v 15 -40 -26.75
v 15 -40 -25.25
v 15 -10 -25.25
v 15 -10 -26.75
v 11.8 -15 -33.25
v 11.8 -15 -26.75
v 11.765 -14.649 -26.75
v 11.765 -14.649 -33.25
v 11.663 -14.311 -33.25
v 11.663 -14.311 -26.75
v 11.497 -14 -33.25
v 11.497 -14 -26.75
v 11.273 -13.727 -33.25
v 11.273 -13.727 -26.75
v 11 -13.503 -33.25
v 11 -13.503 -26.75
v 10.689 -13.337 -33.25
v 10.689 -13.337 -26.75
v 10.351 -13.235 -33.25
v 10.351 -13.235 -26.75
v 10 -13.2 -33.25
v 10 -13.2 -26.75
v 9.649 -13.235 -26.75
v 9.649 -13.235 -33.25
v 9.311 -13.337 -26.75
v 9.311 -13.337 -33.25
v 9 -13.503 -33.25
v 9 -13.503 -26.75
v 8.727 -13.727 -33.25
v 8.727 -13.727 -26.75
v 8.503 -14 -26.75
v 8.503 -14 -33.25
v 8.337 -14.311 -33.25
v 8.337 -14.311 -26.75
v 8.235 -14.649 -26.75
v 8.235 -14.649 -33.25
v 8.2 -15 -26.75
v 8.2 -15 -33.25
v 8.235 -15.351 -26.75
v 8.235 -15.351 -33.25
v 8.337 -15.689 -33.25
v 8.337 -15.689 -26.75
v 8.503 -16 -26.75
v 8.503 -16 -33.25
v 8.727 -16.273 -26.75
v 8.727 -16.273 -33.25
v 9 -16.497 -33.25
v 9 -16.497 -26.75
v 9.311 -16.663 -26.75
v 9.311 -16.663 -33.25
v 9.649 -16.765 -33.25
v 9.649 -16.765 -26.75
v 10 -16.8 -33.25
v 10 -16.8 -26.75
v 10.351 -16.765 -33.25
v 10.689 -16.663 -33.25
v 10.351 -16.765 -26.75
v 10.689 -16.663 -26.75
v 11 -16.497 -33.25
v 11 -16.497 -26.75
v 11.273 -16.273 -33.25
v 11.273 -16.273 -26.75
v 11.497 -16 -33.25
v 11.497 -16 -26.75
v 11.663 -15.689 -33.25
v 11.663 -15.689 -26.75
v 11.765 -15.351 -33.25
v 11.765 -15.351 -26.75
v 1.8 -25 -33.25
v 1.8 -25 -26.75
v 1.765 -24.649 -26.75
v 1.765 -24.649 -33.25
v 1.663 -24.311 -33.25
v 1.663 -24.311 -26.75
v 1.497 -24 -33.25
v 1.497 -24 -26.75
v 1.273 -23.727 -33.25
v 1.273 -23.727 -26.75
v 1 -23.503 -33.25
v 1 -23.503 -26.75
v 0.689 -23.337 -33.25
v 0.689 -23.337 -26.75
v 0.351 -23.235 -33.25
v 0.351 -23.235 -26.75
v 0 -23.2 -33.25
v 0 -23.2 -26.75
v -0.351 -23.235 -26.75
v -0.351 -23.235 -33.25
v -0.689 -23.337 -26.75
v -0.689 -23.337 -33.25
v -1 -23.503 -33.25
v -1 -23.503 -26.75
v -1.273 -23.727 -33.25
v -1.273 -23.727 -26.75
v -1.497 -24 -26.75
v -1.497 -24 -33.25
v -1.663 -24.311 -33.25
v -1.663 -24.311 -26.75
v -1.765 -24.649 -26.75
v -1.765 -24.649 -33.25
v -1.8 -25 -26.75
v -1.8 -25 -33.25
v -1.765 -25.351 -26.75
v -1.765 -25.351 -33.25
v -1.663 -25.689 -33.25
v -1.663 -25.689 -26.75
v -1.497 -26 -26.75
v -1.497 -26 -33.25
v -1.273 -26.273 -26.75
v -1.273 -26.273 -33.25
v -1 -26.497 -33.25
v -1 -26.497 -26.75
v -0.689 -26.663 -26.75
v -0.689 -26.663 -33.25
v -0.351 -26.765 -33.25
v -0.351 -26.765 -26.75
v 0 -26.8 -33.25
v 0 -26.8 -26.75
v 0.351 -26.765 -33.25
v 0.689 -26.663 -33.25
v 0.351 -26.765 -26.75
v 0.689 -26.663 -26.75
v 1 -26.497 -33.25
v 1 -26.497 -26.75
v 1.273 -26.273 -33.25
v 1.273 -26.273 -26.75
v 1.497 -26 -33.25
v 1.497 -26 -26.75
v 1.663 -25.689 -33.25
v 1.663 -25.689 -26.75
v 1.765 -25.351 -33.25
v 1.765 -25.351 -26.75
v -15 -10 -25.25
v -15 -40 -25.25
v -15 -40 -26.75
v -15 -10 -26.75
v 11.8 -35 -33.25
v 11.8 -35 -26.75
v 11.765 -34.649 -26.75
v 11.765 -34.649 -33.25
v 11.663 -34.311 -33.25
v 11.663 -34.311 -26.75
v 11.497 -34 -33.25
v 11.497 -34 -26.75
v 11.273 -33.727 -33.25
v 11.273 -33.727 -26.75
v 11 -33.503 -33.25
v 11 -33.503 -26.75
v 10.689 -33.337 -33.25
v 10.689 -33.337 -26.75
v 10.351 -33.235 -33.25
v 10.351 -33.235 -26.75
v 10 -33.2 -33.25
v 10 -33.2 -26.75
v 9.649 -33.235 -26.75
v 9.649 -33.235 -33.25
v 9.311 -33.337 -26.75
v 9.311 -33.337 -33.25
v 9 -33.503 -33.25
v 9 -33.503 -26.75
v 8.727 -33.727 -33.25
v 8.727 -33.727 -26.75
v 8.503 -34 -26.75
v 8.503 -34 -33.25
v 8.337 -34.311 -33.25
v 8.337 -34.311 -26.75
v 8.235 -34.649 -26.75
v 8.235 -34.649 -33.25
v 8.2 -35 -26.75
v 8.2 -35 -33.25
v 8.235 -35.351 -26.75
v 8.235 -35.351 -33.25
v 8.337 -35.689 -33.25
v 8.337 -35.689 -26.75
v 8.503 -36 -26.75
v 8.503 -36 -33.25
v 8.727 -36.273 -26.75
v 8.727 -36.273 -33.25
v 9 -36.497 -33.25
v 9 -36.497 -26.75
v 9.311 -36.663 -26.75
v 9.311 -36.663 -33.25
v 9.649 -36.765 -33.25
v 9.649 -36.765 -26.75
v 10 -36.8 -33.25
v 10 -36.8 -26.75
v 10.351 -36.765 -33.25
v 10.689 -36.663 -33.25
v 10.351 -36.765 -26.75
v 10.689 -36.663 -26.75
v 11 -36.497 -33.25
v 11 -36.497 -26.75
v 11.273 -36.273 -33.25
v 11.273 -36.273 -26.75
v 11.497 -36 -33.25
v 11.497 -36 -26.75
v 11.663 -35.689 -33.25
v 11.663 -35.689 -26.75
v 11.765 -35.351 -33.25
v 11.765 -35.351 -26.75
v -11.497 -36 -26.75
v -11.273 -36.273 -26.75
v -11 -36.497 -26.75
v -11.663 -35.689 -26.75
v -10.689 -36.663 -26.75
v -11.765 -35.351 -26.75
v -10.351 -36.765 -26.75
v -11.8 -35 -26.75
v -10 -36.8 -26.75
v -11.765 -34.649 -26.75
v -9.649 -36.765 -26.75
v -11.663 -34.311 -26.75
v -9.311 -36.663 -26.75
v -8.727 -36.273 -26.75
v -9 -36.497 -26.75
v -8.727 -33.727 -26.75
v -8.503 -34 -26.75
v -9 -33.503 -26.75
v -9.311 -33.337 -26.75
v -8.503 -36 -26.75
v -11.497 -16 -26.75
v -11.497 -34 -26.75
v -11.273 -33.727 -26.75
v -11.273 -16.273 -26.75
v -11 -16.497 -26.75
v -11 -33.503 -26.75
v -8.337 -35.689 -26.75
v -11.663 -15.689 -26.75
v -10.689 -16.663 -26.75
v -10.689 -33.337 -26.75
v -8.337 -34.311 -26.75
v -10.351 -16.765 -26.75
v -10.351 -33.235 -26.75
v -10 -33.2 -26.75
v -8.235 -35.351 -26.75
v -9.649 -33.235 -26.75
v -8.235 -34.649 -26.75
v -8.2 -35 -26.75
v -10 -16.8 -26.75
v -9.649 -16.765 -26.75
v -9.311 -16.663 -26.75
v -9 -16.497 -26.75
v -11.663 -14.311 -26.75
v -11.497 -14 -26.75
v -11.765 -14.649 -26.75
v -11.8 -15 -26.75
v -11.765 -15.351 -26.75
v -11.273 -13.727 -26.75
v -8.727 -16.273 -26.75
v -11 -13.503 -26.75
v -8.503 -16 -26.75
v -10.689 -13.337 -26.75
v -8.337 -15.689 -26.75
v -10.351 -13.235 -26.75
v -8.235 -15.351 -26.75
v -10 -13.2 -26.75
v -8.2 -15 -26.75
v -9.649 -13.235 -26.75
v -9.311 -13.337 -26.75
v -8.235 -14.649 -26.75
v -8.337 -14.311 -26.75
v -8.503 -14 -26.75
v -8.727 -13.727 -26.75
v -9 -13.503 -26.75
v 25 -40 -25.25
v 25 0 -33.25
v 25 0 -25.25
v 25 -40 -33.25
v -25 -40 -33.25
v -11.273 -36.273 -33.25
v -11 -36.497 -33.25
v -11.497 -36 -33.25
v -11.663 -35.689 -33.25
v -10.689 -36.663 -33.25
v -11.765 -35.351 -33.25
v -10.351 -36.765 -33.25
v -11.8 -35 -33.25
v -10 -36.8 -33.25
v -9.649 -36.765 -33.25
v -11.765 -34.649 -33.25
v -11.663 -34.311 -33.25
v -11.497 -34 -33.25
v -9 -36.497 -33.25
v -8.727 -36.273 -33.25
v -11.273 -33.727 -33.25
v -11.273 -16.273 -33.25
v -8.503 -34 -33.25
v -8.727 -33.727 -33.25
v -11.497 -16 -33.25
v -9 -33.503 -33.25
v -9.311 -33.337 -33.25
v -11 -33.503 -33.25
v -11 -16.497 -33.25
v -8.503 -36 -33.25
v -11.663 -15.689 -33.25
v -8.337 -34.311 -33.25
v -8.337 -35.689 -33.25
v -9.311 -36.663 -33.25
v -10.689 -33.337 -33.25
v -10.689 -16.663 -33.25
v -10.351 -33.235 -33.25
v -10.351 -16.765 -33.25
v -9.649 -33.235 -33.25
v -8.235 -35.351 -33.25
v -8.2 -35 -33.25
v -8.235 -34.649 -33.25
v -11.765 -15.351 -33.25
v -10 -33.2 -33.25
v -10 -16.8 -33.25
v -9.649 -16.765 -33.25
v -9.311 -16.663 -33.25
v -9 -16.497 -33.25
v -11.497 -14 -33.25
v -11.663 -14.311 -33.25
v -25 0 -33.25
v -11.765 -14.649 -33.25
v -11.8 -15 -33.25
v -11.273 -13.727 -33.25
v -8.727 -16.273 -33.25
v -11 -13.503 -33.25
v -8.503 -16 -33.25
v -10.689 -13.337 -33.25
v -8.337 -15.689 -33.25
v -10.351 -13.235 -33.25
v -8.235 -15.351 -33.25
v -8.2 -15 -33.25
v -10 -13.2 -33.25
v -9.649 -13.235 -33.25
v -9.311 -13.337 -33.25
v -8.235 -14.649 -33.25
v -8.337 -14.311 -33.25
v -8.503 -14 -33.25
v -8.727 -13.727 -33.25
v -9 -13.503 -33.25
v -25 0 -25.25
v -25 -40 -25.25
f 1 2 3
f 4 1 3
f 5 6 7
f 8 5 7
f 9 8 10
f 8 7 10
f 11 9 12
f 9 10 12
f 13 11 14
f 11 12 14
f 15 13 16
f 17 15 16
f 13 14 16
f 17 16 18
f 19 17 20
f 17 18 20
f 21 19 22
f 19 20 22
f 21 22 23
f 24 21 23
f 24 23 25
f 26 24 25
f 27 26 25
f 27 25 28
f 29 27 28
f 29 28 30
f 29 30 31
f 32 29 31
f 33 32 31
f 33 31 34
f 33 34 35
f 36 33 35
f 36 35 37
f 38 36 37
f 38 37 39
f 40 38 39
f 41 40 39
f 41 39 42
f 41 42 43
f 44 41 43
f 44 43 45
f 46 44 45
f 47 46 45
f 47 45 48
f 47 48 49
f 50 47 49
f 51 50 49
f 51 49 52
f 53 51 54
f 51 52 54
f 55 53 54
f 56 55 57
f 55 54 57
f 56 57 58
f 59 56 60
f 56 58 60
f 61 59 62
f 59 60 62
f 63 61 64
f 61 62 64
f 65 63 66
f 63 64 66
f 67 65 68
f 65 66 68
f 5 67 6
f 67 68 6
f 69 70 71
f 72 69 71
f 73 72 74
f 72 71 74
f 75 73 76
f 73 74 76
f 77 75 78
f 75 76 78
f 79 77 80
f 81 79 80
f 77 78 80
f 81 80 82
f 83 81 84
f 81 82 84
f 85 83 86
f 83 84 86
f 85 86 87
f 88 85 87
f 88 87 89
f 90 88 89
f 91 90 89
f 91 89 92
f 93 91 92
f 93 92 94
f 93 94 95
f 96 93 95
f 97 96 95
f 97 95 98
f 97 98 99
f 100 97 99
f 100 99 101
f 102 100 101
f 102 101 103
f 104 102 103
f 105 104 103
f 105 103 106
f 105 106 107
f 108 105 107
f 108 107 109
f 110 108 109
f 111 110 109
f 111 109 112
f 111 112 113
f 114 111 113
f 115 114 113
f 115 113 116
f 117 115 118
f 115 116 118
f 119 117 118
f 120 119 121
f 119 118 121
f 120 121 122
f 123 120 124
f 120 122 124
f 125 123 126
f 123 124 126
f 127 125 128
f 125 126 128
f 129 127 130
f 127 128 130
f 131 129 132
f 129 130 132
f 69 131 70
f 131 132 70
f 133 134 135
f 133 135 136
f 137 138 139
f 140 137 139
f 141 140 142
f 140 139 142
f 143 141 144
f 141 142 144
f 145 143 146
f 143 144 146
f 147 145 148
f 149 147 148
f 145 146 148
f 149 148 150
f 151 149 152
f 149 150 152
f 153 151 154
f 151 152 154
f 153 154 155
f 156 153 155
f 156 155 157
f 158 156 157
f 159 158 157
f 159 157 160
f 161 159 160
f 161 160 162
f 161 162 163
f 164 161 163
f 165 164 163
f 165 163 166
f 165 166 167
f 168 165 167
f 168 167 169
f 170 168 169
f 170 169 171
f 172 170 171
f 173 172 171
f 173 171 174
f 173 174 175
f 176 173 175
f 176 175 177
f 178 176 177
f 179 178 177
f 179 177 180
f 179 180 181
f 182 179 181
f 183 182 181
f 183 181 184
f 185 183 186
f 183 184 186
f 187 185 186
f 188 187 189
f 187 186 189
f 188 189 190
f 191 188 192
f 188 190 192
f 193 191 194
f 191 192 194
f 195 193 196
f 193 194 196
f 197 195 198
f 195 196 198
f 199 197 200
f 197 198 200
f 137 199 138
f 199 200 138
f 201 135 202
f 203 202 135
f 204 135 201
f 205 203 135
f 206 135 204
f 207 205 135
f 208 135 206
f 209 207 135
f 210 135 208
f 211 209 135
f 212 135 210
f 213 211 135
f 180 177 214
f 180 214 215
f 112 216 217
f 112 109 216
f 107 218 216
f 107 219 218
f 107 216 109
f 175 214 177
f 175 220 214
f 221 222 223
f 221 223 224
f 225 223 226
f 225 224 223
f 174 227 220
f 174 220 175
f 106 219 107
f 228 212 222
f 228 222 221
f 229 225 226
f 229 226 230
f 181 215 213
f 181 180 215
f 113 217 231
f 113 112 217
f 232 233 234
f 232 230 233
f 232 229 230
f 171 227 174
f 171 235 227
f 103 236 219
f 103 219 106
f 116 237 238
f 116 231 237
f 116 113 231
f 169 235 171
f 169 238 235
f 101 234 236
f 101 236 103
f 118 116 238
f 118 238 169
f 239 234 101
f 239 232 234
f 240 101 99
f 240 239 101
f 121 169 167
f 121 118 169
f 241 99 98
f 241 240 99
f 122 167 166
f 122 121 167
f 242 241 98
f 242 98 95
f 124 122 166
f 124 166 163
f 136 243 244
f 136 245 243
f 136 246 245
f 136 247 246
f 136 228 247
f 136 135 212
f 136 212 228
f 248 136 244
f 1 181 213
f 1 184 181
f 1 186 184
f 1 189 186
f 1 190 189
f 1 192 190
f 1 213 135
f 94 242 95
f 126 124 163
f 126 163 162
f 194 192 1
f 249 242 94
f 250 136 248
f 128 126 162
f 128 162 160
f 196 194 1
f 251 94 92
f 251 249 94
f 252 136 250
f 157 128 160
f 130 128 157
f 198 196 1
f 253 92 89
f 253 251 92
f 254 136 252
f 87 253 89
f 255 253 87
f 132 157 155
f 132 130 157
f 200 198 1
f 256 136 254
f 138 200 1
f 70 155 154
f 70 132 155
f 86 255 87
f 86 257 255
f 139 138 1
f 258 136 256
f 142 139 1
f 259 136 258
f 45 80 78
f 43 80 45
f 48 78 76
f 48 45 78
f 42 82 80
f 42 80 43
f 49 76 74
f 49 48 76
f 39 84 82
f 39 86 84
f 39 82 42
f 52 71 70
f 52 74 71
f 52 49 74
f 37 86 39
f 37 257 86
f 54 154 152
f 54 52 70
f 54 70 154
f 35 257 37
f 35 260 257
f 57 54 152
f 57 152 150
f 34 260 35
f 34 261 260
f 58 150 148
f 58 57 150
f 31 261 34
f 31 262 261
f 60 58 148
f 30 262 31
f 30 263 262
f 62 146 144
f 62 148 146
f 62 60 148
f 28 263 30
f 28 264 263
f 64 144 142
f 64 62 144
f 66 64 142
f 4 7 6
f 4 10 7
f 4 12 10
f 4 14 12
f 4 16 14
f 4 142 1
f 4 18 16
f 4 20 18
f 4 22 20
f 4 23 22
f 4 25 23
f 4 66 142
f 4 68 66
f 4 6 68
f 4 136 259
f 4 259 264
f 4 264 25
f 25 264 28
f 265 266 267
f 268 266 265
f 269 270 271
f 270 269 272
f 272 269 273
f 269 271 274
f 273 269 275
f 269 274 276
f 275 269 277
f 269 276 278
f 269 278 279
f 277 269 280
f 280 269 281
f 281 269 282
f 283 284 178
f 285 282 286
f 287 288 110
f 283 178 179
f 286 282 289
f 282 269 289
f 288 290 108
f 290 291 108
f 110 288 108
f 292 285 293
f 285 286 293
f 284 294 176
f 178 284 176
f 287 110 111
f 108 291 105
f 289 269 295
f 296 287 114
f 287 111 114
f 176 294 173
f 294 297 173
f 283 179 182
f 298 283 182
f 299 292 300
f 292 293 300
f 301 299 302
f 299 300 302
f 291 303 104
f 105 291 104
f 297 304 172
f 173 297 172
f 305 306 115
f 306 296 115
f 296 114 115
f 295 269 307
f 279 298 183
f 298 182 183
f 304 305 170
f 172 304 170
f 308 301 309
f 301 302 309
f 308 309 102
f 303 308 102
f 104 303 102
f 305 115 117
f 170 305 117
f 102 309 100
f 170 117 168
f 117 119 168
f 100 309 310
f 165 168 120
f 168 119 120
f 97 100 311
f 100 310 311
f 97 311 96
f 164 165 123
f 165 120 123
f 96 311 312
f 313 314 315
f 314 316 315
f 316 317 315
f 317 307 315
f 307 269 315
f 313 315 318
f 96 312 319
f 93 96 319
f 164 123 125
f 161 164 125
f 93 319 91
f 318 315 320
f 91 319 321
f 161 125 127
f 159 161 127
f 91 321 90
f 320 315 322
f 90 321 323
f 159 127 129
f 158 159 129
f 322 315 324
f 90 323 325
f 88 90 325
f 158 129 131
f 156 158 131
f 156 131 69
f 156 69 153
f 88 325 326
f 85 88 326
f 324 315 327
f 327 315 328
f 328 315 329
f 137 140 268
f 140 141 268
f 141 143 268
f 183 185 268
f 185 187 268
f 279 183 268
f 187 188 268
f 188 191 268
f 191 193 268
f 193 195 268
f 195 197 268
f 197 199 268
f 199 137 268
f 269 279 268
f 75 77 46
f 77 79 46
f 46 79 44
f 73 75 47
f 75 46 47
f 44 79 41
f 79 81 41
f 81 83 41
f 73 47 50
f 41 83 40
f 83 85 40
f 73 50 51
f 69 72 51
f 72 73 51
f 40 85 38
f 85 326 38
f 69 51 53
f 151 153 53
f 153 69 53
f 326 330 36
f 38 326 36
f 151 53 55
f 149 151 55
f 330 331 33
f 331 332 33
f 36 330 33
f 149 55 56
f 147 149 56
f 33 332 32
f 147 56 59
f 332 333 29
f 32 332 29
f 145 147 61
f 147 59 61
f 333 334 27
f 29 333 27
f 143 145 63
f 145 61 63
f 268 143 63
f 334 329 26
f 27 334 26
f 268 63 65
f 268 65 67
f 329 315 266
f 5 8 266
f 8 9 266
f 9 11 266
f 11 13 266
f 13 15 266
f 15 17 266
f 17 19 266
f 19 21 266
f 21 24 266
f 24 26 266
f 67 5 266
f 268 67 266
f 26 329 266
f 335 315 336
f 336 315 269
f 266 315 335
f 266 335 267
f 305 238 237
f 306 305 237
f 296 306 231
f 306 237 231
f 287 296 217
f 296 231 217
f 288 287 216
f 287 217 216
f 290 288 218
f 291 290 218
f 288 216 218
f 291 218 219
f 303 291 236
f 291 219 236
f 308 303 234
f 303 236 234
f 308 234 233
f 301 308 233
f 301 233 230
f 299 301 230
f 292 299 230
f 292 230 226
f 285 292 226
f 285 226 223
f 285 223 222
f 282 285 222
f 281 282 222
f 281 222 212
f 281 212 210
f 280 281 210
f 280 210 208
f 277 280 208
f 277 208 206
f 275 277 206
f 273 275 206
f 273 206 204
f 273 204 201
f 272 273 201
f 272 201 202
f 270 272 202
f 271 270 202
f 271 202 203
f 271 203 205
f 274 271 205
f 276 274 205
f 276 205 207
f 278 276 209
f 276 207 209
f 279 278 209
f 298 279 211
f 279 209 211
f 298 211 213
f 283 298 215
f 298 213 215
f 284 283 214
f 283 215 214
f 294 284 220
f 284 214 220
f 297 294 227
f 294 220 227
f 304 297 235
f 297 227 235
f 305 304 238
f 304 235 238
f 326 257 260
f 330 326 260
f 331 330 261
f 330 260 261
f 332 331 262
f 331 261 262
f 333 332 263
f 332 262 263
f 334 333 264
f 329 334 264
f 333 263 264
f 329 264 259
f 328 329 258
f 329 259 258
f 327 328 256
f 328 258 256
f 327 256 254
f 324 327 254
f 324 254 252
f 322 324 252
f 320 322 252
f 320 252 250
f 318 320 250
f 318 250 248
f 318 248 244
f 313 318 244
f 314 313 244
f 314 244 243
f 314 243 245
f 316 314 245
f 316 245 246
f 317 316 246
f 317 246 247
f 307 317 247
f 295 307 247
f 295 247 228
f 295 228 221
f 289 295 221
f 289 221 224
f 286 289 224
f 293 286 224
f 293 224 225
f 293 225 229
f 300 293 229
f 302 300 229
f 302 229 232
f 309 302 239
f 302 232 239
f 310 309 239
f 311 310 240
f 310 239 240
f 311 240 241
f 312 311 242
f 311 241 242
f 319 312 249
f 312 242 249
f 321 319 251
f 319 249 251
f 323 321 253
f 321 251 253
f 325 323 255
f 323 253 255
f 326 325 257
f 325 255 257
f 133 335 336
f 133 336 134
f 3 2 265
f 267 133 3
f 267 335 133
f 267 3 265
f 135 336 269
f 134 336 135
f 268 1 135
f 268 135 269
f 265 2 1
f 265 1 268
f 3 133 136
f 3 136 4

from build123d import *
from build123d import SkipClean  # not in build123d's __all__

# Parameters (mm, degrees)
F0_R      = 2.85
F0_R_2    = 11
F1_DEPTH  = 40
F2_W      = 30
F2_H      = 30
F3_DEPTH  = 55
F5_DEPTH  = 30
F6_DEPTH  = 40.001
F7_DEPTH  = 40.001
F8_R      = 1.8
F9_DEPTH  = 11.5
F10_DEPTH = 13
F11_DEPTH = 5


with BuildPart() as f1:
    # F0 (on Front) → F1 (new body)
    with BuildSketch(Plane.XZ):
        with BuildLine():
            Line((15, 28.25), (-15, 28.25))
            ThreePointArc((-15, 28.25), (-22.0710678119, 25.3210678119), (-25, 18.25))
            Line((-25, 18.25), (-25, -38.25))
            Line((-25, -38.25), (25, -38.25))
            Line((25, -38.25), (25, 18.25))
            ThreePointArc((25, 18.25), (22.0710678119, 25.3210678119), (15, 28.25))
        make_face()
        with Locations((0, -18.25)):
            Circle(F0_R, mode=Mode.SUBTRACT)
        Circle(F0_R_2, mode=Mode.SUBTRACT)
        with Locations((0, 18.25)):
            Circle(F0_R, mode=Mode.SUBTRACT)
    extrude(amount=F1_DEPTH)

    # F2 (on face) → F3 (cut)
    with BuildSketch(Plane.XY.offset(28.25)):
        with Locations((0, -25)):
            Rectangle(F2_W, F2_H)
    extrude(amount=-F3_DEPTH, mode=Mode.SUBTRACT)

    # F4 (on face) → F5 (join, through all)
    with BuildSketch(Plane.XZ.offset(40)):
        with BuildLine():
            Line((-15, 17.2291616466), (-15, 19.972135955))
            ThreePointArc((-15, 19.972135955), (-20, 15.5), (-15, 11.027864045))
            Line((-15, 11.027864045), (-15, 13.7708383534))
            ThreePointArc((-15, 13.7708383534), (-17.3, 15.5), (-15, 17.2291616466))
        make_face()
        with BuildLine():
            Line((-15, -17.2291616466), (-15, -19.972135955))
            ThreePointArc((-15, -19.972135955), (-12.1458980338, -18.5), (-11, -15.5))
            ThreePointArc((-11, -15.5), (-12.1458980338, -12.5), (-15, -11.027864045))
            Line((-15, -11.027864045), (-15, -13.7708383534))
            ThreePointArc((-15, -13.7708383534), (-14.061250543, -14.4183346174), (-13.7, -15.5))
            ThreePointArc((-13.7, -15.5), (-14.061250543, -16.5816653826), (-15, -17.2291616466))
        make_face()
        with BuildLine():
            ThreePointArc((20, -15.5), (18.5, -12.1458980338), (15, -11.027864045))
            Line((15, -11.027864045), (15, -13.7708383534))
            ThreePointArc((15, -13.7708383534), (16.5816653826, -14.061250543), (17.3, -15.5))
            ThreePointArc((17.3, -15.5), (16.5816653826, -16.938749457), (15, -17.2291616466))
            Line((15, -17.2291616466), (15, -19.972135955))
            ThreePointArc((15, -19.972135955), (18.5, -18.8541019662), (20, -15.5))
        make_face()
        with BuildLine():
            Line((15, 17.2291616466), (15, 19.972135955))
            ThreePointArc((15, 19.972135955), (11, 15.5), (15, 11.027864045))
            Line((15, 11.027864045), (15, 13.7708383534))
            ThreePointArc((15, 13.7708383534), (13.7, 15.5), (15, 17.2291616466))
        make_face()
    extrude(amount=-F5_DEPTH)

    # F4 (on face) → F6 (cut, through all)
    with BuildSketch(Plane.XZ.offset(40)):
        with BuildLine():
            ThreePointArc((-13.7, 15.5), (-14.061250543, 16.5816653826), (-15, 17.2291616466))
            Line((-15, 17.2291616466), (-15, 13.7708383534))
            ThreePointArc((-15, 13.7708383534), (-14.061250543, 14.4183346174), (-13.7, 15.5))
        make_face()
        with BuildLine():
            ThreePointArc((17.3, 15.5), (16.5816653826, 16.938749457), (15, 17.2291616466))
            Line((15, 17.2291616466), (15, 13.7708383534))
            ThreePointArc((15, 13.7708383534), (16.5816653826, 14.061250543), (17.3, 15.5))
        make_face()
        with BuildLine():
            Line((15, -17.2291616466), (15, -13.7708383534))
            ThreePointArc((15, -13.7708383534), (13.7, -15.5), (15, -17.2291616466))
        make_face()
        with BuildLine():
            ThreePointArc((-15, -13.7708383534), (-17.3, -15.5), (-15, -17.2291616466))
            Line((-15, -17.2291616466), (-15, -13.7708383534))
        make_face()
    with SkipClean():  # cleaning this boolean's faces spoils the solid; the shape is the same uncleaned
        extrude(amount=-F6_DEPTH, mode=Mode.SUBTRACT)

    # F4 (on face) → F7 (cut, through all)
    with BuildSketch(Plane.XZ.offset(40)):
        with BuildLine():
            Line((-15, 13.7708383534), (-15, 17.2291616466))
            ThreePointArc((-15, 17.2291616466), (-17.3, 15.5), (-15, 13.7708383534))
        make_face()
        with BuildLine():
            Line((15, 13.7708383534), (15, 17.2291616466))
            ThreePointArc((15, 17.2291616466), (13.7, 15.5), (15, 13.7708383534))
        make_face()
        with BuildLine():
            Line((-15, -13.7708383534), (-15, -17.2291616466))
            ThreePointArc((-15, -17.2291616466), (-14.061250543, -16.5816653826), (-13.7, -15.5))
            ThreePointArc((-13.7, -15.5), (-14.061250543, -14.4183346174), (-15, -13.7708383534))
        make_face()
        with BuildLine():
            ThreePointArc((17.3, -15.5), (16.5816653826, -14.061250543), (15, -13.7708383534))
            Line((15, -13.7708383534), (15, -17.2291616466))
            ThreePointArc((15, -17.2291616466), (16.5816653826, -16.938749457), (17.3, -15.5))
        make_face()
    with SkipClean():  # cleaning this boolean's faces spoils the solid; the shape is the same uncleaned
        extrude(amount=-F7_DEPTH, mode=Mode.SUBTRACT)

    # F8 (on face) → F9 (cut, through all)
    with BuildSketch(Plane.XY.offset(-26.75)):
        with Locations((-10, -15)):
            Circle(F8_R)
        with Locations((10, -15)):
            Circle(F8_R)
        with Locations((-10, -35)):
            Circle(F8_R)
        with Locations((10, -35)):
            Circle(F8_R)
        with Locations((0, -25)):
            Circle(F8_R)
    extrude(amount=-F9_DEPTH, mode=Mode.SUBTRACT)

    # F10 (intersect): a face of the model
    f10_faces = [f1.faces().sort_by_distance(p)[0] for p in [
        (0, -19.8694432325, -38.25),
    ]]
    extrude(f10_faces, amount=-F10_DEPTH, mode=Mode.INTERSECT)

    # F11 (cut): a face of the model
    f11_faces = [f1.faces().sort_by_distance(p)[0] for p in [
        (0, -19.8694432325, -38.25),
    ]]
    extrude(f11_faces, amount=-F11_DEPTH, mode=Mode.SUBTRACT)


solid = f1.part
